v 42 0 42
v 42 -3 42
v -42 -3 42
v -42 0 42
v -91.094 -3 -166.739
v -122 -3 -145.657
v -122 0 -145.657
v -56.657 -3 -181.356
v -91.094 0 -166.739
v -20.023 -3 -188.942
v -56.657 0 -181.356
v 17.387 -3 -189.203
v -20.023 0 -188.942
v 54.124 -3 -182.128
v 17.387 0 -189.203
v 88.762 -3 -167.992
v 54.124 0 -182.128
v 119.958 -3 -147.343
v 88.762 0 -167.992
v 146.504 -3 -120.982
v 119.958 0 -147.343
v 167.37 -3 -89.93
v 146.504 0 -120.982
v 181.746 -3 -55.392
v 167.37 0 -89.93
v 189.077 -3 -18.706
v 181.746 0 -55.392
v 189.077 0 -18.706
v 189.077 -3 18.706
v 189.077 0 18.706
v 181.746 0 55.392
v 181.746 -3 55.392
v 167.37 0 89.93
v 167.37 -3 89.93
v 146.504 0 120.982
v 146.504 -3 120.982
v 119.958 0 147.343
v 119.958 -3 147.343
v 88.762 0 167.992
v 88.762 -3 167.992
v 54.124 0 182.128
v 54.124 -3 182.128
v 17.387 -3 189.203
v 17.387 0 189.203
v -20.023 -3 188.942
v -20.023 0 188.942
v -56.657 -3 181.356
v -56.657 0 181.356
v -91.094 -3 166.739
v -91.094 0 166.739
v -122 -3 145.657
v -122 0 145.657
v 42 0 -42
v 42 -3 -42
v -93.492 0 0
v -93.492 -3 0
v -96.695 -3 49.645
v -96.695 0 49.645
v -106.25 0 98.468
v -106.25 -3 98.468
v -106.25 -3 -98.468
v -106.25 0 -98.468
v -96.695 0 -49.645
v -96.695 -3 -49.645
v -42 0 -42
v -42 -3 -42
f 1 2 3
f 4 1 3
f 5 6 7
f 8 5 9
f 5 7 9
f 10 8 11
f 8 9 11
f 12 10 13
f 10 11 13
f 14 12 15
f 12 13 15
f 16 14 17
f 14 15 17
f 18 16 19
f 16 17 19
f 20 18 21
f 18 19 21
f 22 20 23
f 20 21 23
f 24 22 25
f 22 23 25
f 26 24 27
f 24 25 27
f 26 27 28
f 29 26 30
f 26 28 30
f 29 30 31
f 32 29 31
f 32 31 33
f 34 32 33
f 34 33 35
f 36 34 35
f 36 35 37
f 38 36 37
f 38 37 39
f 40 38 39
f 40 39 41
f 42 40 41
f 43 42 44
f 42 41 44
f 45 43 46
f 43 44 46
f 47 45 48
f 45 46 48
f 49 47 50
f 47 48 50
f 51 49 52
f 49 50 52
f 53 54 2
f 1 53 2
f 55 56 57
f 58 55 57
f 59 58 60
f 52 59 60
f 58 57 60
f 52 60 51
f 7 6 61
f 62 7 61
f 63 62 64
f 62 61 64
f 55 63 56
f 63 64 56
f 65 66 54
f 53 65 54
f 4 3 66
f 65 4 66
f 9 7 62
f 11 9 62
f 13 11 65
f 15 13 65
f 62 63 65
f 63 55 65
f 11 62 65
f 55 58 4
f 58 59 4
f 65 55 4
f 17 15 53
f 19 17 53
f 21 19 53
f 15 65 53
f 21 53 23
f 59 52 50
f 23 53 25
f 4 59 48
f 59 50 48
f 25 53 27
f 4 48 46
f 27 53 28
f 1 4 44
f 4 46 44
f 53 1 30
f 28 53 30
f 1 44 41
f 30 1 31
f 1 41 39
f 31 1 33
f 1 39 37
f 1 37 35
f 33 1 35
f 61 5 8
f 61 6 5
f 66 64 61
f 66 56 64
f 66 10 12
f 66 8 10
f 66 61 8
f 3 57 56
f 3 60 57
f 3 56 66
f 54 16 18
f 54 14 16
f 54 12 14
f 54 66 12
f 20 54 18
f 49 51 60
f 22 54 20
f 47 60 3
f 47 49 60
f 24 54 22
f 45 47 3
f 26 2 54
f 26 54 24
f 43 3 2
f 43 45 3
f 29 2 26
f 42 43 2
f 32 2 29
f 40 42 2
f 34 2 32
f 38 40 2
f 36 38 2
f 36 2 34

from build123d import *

# Parameters (mm, degrees)
F0_R     = 190
F1_DEPTH = 3
F2_W     = 42
F2_H     = 42
F3_DEPTH = 3.001
F5_DEPTH = 3.001


with BuildPart() as f1:
    # F0 (on Front) → F1 (new body)
    with BuildSketch(Plane.XZ):
        Circle(F0_R)
    extrude(amount=F1_DEPTH)

    # F2 (on face) → F3 (cut, through all)
    with BuildSketch(Plane.XZ.offset(3)):
        with Locations((-21, -21)):
            Rectangle(F2_W, F2_H)
        with Locations((21, -21)):
            Rectangle(F2_W, F2_H)
        with Locations((21, 21)):
            Rectangle(F2_W, F2_H)
        with Locations((-21, 21)):
            Rectangle(F2_W, F2_H)
    extrude(amount=-F3_DEPTH, mode=Mode.SUBTRACT)

    # F4 (on face) → F5 (cut, through all)
    with BuildSketch(Plane.XZ.offset(3)):
        with BuildLine():
            ThreePointArc((-122, -145.6571316483), (-100.6859205662, -74.2103602534), (-93.4919261309, 0))
            Line((-93.4919261309, 0), (-122, 0))
            Line((-122, 0), (-122, -145.6571316483))
        make_face()
        with BuildLine():
            Line((-122, 0), (-93.4919261309, 0))
            ThreePointArc((-93.4919261309, 0), (-100.6859205662, 74.2103602533), (-122, 145.6571316483))
            Line((-122, 145.6571316483), (-122, 0))
        make_face()
        with BuildLine():
            Line((-122, -145.6571316483), (-122, 0))
            Line((-122, 0), (-122, 145.6571316483))
            ThreePointArc((-122, 145.6571316483), (-190, 0), (-122, -145.6571316483))
        make_face()
    extrude(amount=-F5_DEPTH, mode=Mode.SUBTRACT)


solid = f1.part
